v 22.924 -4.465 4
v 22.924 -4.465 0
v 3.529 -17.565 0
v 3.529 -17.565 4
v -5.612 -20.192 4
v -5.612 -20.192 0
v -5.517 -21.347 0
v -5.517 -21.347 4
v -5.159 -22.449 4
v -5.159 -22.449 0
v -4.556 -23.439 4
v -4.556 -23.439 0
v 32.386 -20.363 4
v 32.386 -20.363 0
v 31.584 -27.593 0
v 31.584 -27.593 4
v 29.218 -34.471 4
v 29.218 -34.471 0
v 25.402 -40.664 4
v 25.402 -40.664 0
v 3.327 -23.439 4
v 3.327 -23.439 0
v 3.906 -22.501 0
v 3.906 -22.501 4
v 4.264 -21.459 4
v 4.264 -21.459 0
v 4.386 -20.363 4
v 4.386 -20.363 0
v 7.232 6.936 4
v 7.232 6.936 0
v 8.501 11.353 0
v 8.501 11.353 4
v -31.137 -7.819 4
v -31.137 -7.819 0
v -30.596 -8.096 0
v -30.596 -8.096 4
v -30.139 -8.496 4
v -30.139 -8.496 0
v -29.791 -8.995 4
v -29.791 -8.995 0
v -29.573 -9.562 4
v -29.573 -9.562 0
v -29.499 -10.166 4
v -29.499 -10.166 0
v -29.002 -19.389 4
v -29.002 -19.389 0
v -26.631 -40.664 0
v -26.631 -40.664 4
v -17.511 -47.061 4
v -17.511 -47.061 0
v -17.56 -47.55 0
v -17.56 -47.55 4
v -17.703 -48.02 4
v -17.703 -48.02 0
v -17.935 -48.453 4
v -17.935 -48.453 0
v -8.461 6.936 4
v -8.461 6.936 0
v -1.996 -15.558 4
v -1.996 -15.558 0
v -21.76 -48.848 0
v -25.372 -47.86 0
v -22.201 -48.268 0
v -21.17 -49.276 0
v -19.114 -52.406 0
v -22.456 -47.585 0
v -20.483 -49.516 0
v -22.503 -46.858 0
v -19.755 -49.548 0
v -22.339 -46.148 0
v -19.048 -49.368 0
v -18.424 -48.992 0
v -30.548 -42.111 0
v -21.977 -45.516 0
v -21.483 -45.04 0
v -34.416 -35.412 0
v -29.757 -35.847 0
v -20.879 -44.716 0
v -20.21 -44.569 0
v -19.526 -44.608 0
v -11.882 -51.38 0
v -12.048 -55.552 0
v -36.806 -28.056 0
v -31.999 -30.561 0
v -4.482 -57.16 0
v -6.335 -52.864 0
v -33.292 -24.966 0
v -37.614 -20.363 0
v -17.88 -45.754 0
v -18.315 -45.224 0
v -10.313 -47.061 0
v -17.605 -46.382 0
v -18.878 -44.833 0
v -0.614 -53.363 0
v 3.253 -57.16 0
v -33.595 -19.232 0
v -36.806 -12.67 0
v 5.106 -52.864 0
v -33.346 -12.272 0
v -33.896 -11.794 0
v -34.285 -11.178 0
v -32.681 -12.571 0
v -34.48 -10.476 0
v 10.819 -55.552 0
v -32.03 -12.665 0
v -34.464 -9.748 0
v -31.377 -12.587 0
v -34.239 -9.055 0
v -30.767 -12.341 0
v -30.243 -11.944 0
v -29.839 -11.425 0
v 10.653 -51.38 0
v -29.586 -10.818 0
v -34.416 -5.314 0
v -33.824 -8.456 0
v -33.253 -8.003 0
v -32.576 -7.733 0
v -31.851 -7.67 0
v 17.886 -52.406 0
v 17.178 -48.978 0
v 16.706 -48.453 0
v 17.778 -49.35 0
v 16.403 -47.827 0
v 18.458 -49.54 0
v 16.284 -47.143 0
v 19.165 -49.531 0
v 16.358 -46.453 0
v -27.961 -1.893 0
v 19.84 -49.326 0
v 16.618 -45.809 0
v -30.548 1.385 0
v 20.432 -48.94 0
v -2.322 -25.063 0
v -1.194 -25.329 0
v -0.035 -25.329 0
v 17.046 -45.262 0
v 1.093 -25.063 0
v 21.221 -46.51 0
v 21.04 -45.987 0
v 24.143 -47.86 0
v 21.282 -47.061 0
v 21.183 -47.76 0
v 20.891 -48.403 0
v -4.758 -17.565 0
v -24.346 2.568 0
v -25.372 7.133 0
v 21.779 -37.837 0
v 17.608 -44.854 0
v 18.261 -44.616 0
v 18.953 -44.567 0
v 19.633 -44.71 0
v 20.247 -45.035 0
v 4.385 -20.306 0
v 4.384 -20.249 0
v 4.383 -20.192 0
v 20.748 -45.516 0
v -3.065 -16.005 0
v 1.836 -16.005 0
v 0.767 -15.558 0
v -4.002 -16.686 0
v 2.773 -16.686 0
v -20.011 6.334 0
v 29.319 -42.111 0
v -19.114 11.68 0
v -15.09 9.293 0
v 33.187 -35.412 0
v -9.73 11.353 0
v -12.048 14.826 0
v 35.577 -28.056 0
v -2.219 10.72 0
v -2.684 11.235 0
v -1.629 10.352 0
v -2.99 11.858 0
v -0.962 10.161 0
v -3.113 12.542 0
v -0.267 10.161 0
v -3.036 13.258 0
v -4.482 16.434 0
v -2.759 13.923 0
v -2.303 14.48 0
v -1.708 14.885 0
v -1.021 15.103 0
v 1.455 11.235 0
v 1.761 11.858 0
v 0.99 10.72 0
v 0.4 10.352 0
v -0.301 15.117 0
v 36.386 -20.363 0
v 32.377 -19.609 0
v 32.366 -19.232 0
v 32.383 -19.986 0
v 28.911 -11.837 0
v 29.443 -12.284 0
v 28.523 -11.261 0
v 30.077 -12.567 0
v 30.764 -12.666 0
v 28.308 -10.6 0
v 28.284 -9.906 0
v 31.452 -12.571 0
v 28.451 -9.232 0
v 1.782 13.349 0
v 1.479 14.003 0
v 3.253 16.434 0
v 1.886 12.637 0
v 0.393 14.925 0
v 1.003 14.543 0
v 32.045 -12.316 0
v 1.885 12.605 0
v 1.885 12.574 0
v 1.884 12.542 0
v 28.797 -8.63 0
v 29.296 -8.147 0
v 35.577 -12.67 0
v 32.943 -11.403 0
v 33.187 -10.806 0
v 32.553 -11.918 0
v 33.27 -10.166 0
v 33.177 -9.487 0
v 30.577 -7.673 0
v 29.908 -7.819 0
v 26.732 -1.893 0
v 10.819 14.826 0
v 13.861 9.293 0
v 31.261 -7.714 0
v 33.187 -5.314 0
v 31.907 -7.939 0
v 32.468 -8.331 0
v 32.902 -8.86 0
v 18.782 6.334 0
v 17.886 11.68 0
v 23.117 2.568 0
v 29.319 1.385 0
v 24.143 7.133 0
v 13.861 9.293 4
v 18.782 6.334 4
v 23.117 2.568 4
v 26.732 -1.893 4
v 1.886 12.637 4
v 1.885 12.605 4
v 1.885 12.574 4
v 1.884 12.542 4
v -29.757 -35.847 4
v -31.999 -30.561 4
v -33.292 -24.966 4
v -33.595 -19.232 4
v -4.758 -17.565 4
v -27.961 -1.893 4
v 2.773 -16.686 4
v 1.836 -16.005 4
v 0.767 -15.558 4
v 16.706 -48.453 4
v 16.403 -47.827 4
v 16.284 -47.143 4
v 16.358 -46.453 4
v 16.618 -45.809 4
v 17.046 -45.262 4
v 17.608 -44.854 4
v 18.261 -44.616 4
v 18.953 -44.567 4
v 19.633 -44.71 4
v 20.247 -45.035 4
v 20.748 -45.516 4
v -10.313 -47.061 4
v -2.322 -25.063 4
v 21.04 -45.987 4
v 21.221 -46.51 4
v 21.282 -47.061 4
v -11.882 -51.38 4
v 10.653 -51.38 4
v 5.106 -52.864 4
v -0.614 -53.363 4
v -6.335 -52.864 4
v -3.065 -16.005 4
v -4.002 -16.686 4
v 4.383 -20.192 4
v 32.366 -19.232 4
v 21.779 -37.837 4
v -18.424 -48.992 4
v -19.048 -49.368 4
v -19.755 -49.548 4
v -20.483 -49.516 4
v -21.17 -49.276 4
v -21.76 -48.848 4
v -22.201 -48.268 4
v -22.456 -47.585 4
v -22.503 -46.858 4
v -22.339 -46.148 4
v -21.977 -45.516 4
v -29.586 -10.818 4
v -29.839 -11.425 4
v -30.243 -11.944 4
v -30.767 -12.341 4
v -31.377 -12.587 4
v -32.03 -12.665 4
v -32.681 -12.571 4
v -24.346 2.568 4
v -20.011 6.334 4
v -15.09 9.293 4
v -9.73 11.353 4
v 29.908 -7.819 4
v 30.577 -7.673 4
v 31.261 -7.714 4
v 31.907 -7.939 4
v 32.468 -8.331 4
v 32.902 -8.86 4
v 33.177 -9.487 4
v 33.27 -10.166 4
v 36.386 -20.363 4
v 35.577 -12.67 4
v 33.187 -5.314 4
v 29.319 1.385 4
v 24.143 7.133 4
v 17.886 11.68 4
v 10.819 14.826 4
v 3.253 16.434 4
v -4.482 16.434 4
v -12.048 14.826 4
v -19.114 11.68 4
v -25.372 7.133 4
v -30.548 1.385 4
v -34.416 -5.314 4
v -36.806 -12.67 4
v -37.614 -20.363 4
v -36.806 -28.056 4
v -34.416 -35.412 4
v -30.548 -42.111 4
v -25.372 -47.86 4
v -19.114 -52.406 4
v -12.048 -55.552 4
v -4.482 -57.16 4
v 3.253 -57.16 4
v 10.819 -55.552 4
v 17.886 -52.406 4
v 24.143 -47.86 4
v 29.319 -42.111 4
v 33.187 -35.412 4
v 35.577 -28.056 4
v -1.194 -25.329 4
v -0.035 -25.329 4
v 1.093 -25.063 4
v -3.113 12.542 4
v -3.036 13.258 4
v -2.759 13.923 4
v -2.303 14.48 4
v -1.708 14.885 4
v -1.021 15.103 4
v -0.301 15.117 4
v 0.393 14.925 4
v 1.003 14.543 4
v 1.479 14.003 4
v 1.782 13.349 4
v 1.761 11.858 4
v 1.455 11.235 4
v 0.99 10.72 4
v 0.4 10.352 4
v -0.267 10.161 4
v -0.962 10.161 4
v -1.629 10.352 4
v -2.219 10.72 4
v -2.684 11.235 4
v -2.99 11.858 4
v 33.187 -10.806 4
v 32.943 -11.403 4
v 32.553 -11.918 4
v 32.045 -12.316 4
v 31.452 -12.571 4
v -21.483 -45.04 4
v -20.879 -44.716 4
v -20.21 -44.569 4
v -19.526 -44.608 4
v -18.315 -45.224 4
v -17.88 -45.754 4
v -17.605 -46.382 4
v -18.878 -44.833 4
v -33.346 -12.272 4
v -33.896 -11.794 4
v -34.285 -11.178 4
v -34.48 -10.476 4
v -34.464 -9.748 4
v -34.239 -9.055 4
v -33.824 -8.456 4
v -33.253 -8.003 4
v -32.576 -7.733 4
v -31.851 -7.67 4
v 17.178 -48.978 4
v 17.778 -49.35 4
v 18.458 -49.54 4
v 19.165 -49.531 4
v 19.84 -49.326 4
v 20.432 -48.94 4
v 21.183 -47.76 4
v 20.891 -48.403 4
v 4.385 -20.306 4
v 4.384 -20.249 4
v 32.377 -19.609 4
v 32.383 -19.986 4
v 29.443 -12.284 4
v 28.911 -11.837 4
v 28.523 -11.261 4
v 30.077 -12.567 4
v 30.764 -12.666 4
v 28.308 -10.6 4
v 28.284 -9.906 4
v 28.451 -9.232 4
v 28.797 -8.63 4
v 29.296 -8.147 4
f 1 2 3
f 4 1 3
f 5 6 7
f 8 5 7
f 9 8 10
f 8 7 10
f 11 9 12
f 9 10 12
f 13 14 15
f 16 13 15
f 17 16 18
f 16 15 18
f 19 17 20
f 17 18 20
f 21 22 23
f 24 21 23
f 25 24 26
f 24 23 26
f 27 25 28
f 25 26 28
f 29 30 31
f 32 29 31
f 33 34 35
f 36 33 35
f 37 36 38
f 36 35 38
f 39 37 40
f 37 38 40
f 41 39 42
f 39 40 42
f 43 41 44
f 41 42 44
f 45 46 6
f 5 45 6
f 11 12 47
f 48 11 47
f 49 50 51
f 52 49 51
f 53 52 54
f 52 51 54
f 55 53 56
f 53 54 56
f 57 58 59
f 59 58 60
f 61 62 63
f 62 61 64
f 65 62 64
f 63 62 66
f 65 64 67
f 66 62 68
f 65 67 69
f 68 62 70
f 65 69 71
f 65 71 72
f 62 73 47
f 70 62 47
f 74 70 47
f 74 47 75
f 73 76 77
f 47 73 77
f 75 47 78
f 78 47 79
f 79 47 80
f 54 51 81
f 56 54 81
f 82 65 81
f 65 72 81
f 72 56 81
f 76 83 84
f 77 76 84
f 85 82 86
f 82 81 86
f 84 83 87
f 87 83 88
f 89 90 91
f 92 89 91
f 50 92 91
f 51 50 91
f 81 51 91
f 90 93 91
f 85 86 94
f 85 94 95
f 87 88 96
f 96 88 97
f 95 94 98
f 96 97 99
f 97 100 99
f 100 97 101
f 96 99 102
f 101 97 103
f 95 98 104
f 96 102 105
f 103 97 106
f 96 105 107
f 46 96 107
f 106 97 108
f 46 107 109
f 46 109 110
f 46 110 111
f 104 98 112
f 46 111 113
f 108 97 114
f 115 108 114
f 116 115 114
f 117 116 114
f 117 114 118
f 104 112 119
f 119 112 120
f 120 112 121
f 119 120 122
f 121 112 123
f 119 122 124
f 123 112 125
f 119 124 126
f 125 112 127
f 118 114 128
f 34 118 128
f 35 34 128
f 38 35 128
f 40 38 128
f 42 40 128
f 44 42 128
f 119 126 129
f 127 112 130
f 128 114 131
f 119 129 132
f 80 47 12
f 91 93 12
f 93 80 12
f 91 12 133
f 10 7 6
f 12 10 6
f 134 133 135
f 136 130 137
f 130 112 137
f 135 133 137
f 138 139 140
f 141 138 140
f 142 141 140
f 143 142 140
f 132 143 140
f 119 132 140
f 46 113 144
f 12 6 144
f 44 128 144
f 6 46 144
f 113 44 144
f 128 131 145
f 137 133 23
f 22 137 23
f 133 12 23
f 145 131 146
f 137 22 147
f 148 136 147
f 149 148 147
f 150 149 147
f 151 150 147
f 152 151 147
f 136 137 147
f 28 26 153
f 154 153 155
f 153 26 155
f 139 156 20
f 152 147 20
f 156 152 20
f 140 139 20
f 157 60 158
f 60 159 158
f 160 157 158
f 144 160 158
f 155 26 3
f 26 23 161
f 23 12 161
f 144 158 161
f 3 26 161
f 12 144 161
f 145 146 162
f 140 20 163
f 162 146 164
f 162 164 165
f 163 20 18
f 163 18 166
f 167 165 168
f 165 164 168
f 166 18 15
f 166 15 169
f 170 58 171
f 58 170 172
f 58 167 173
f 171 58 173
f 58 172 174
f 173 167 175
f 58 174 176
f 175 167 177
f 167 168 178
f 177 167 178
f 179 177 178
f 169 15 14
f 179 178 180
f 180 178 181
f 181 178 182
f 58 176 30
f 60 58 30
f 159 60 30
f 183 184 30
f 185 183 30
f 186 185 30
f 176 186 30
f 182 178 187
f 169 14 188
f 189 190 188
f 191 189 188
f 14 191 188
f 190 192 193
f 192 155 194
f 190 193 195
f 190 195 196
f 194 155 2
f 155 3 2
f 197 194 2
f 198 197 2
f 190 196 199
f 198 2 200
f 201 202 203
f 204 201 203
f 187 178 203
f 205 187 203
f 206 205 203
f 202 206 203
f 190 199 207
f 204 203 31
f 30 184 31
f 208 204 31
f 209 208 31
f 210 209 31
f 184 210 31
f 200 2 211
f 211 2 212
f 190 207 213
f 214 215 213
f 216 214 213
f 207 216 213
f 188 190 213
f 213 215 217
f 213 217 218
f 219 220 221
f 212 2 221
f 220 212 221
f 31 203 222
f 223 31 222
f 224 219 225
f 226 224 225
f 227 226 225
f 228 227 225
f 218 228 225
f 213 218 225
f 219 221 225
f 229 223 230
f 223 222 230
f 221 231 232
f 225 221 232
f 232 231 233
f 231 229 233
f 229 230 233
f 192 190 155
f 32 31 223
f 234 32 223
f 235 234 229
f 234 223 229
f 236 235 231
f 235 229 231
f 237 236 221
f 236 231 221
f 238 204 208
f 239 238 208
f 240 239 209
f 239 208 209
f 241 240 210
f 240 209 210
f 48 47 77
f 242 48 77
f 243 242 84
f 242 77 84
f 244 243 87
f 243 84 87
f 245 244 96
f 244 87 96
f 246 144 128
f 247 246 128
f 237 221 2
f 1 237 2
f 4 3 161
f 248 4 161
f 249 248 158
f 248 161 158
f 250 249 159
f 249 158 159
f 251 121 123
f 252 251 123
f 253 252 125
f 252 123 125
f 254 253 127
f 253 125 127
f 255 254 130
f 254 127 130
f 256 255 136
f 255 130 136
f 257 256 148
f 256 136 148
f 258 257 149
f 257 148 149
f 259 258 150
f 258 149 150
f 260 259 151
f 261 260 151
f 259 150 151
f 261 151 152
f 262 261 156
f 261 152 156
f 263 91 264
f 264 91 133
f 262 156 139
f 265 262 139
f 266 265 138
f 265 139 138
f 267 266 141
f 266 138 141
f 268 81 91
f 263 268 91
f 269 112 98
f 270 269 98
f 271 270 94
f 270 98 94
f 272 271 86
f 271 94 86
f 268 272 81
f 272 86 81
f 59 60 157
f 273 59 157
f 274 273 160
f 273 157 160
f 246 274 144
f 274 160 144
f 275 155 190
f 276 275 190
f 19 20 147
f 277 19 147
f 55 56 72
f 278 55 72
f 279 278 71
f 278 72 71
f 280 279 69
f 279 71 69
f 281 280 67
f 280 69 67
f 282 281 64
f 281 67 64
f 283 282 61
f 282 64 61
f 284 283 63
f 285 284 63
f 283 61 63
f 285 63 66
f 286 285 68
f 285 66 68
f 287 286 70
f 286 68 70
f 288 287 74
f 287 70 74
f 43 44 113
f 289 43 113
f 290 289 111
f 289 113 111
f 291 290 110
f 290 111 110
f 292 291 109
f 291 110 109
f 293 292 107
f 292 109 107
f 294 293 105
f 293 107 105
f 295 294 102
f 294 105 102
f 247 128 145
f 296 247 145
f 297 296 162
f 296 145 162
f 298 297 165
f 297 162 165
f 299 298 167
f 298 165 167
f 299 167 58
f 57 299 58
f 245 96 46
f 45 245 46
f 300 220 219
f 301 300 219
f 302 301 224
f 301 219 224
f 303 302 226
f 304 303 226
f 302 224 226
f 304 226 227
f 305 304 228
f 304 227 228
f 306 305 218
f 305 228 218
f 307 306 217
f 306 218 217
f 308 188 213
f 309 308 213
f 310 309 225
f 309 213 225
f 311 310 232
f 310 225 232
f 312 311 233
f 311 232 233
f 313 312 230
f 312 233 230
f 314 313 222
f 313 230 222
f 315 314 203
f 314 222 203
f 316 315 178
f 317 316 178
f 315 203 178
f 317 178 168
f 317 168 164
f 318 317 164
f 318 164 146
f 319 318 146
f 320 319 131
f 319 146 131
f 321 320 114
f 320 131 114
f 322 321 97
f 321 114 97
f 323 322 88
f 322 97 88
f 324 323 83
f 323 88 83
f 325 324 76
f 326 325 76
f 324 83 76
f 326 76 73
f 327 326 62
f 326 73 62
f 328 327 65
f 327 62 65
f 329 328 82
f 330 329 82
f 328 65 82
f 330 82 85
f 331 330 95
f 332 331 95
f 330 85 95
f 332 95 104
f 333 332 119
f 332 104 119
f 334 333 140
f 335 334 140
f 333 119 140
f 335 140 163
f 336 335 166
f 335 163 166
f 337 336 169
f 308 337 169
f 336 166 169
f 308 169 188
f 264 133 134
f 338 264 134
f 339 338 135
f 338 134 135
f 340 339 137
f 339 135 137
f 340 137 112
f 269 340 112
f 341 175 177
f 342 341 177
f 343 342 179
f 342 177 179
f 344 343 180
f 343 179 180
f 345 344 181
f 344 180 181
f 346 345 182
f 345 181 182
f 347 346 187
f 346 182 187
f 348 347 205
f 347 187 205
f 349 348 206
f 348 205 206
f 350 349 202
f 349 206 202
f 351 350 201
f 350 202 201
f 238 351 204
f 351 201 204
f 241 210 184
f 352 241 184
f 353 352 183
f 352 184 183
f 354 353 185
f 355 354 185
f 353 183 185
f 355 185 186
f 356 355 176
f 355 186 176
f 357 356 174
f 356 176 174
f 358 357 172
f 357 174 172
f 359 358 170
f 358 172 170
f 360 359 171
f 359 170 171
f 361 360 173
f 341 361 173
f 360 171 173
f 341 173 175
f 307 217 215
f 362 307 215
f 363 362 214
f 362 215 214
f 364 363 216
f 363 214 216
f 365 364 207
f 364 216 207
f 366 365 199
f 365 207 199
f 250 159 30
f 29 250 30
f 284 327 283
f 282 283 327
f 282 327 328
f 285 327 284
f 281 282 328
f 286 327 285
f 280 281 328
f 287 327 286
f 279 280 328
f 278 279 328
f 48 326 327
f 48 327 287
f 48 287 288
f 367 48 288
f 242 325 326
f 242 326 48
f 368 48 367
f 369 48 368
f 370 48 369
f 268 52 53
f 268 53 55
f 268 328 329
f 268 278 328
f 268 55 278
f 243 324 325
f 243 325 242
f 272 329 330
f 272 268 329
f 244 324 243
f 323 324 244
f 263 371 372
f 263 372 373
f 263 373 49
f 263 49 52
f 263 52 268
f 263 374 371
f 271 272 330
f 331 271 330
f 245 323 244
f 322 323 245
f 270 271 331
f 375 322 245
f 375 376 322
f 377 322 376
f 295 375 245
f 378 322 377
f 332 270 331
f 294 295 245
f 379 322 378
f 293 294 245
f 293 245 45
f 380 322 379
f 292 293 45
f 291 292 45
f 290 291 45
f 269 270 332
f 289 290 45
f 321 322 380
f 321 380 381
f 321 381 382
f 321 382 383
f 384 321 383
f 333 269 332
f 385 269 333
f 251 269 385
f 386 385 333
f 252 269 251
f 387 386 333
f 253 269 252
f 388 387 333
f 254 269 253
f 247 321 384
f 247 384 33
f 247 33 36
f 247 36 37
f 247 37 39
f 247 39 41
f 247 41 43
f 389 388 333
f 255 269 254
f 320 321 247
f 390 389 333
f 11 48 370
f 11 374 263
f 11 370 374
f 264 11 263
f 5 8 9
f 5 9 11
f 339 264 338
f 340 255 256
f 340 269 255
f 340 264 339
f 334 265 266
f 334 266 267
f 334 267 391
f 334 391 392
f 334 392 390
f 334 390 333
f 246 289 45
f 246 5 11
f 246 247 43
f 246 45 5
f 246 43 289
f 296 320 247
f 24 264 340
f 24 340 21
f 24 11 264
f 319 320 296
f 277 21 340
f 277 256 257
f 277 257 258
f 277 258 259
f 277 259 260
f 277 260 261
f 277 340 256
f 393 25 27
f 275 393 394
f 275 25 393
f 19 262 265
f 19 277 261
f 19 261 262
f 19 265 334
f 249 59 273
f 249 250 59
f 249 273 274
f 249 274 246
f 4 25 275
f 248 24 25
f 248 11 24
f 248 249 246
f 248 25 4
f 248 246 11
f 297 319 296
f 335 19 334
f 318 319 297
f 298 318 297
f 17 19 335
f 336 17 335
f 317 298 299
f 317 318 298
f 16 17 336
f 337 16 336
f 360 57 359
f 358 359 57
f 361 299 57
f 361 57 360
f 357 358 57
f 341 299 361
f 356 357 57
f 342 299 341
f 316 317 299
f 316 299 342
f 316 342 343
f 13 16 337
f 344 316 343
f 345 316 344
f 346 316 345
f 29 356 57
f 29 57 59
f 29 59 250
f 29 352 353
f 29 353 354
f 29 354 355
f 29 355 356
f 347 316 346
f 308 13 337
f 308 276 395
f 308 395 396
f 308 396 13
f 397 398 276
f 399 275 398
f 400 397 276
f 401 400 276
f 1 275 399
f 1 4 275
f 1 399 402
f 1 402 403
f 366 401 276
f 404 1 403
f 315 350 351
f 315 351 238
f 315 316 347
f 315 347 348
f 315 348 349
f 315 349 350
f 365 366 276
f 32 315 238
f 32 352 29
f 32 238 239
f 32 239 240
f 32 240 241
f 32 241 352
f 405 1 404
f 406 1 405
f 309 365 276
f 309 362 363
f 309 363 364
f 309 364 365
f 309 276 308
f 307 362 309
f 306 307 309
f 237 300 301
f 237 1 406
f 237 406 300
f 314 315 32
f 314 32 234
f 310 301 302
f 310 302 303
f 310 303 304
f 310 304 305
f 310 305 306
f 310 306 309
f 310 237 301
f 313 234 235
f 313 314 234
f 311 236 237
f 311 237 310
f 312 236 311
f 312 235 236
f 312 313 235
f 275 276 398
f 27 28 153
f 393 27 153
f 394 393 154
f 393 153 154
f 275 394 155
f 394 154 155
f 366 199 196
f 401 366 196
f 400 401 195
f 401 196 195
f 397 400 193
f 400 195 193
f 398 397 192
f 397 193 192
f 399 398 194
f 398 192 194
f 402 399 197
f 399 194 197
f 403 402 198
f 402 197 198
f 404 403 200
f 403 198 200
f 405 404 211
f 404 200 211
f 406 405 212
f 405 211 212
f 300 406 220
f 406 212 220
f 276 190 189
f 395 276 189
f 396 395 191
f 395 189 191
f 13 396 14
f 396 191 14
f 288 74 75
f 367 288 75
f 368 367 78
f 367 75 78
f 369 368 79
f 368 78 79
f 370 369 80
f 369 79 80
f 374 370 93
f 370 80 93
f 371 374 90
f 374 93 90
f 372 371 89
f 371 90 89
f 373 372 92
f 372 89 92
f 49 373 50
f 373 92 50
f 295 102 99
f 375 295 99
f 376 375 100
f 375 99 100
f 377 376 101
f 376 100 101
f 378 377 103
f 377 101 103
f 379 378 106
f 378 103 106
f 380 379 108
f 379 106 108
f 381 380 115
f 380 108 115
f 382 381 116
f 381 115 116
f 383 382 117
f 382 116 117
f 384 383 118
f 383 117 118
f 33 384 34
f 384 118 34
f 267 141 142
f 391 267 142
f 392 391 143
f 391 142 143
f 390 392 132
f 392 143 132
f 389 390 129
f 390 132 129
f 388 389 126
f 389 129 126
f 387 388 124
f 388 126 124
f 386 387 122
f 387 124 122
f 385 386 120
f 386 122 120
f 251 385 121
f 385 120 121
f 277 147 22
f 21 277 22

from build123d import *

# Parameters (mm, degrees)
F0_R     = 37
F1_DEPTH = 4


with BuildPart() as f1:
    # F0 (on Top) → F1 (new body)
    with BuildSketch(Plane.XY):
        with Locations((-0.6144908867, -20.3631758839)):
            Circle(F0_R)
        with BuildLine():
            ThreePointArc((-3.1126967397, 12.5421271465), (-0.6618478689, 15.1363755392), (1.8855091133, 12.6368241161))
            ThreePointArc((1.8855091133, 12.6368241161), (1.8850605363, 12.589467134), (1.8837149663, 12.5421271464))
            ThreePointArc((1.8837149663, 12.5421271465), (5.2227863742, 12.1164514875), (8.5011233102, 11.3528386484))
            ThreePointArc((8.5011233102, 11.3528386484), (18.7824224389, 6.3343849305), (26.7323517041, -1.8929241175))
            ThreePointArc((26.7323517041, -1.8929241175), (28.4716524971, -4.7748384787), (29.9083239169, -7.8189430869))
            ThreePointArc((29.9083239169, -7.8189430869), (32.2012610114, -8.1155997543), (33.270374151, -10.1656150695))
            ThreePointArc((33.270374151, -10.1656150695), (32.7647179948, -11.6731271366), (31.4523000449, -12.570812998))
            ThreePointArc((31.4523000449, -12.570812998), (32.0792882461, -15.8779996316), (32.3661111061, -19.2318526816))
            ThreePointArc((32.3661111061, -19.2318526816), (32.3806592551, -19.7974311378), (32.3855091133, -20.3631758839))
            ThreePointArc((32.3855091133, -20.3631758839), (30.5909369208, -31.0972932369), (25.4024015163, -40.6639470438))
            ThreePointArc((25.4024015163, -40.6639470438), (23.199011587, -43.2086809107), (20.7478519472, -45.5157166828))
            ThreePointArc((20.7478519472, -45.5157166828), (21.1450029953, -46.2432936637), (21.2824224389, -47.0607366982))
            ThreePointArc((21.2824224389, -47.0607366982), (19.5097871405, -49.4525854792), (16.7056699662, -48.452533798))
            ThreePointArc((16.7056699662, -48.452533798), (13.7540985771, -50.0708118857), (10.6530279173, -51.3799942249))
            ThreePointArc((10.6530279173, -51.3799942249), (-0.6144908867, -53.3631758839), (-11.8820096908, -51.3799942249))
            ThreePointArc((-11.8820096908, -51.3799942249), (-14.9830803506, -50.0708118857), (-17.9346517396, -48.452533798))
            ThreePointArc((-17.9346517396, -48.452533798), (-21.4808673431, -49.0832791842), (-21.9768337207, -45.5157166828))
            ThreePointArc((-21.9768337207, -45.5157166828), (-24.4279933605, -43.2086809107), (-26.6313832898, -40.6639470438))
            ThreePointArc((-26.6313832898, -40.6639470438), (-31.9993559245, -30.5607366982), (-33.5950928796, -19.2318526816))
            ThreePointArc((-33.5950928796, -19.2318526816), (-33.3082700196, -15.8779996316), (-32.6812818184, -12.570812998))
            ThreePointArc((-32.6812818184, -12.570812998), (-34.3769972152, -9.3930725835), (-31.1373056904, -7.8189430869))
            ThreePointArc((-31.1373056904, -7.8189430869), (-29.7006342706, -4.7748384787), (-27.9613334776, -1.8929241175))
            ThreePointArc((-27.9613334776, -1.8929241175), (-20.0114042124, 6.3343849305), (-9.7301050837, 11.3528386484))
            ThreePointArc((-9.7301050837, 11.3528386484), (-6.4517681477, 12.1164514875), (-3.1126967397, 12.5421271465))
        make_face(mode=Mode.SUBTRACT)
        with BuildLine():
            ThreePointArc((3.5289701119, -17.564652889), (2.3244353747, -16.318090912), (0.7666627795, -15.5577191365))
            Line((0.7666627795, -15.5577191365), (-0.6144908867, -20.3631758839))
            Line((-0.6144908867, -20.3631758839), (3.5289701119, -17.564652889))
        make_face()
        with BuildLine():
            ThreePointArc((0.7666627795, -15.5577191365), (-0.6144908867, -15.3631758839), (-1.9956445529, -15.5577191365))
            Line((-1.9956445529, -15.5577191365), (-0.6144908867, -20.3631758839))
            Line((-0.6144908867, -20.3631758839), (0.7666627795, -15.5577191365))
        make_face()
        with BuildLine():
            Line((-0.6144908867, -20.3631758839), (-1.9956445529, -15.5577191365))
            ThreePointArc((-1.9956445529, -15.5577191365), (-3.5534171482, -16.318090912), (-4.7579518853, -17.564652889))
            Line((-4.7579518853, -17.564652889), (-0.6144908867, -20.3631758839))
        make_face()
        with BuildLine():
            Line((-0.6144908867, -20.3631758839), (-4.7579518853, -17.564652889))
            ThreePointArc((-4.7579518853, -17.564652889), (-5.3697734682, -18.818090912), (-5.6115517947, -20.1917632774))
            Line((-5.6115517947, -20.1917632774), (-0.6144908867, -20.3631758839))
        make_face()
        with BuildLine():
            Line((-4.5564442811, -23.439050302), (-0.6144908867, -20.3631758839))
            Line((-0.6144908867, -20.3631758839), (-5.6115517947, -20.1917632774))
            ThreePointArc((-5.6115517947, -20.1917632774), (-5.3697734682, -21.9082608557), (-4.5564442811, -23.439050302))
        make_face()
        with BuildLine():
            Line((-2.3216907055, -25.0626938143), (-0.6144908867, -20.3631758839))
            Line((-0.6144908867, -20.3631758839), (-4.5564442811, -23.439050302))
            ThreePointArc((-4.5564442811, -23.439050302), (-3.5534171482, -24.4082608557), (-2.3216907055, -25.0626938143))
        make_face()
        with BuildLine():
            Line((1.0927089321, -25.0626938143), (-0.6144908867, -20.3631758839))
            Line((-0.6144908867, -20.3631758839), (-2.3216907055, -25.0626938143))
            ThreePointArc((-2.3216907055, -25.0626938143), (-0.6144908867, -25.3631758839), (1.0927089321, -25.0626938143))
        make_face()
        with BuildLine():
            Line((3.3274625077, -23.439050302), (-0.6144908867, -20.3631758839))
            Line((-0.6144908867, -20.3631758839), (1.0927089321, -25.0626938143))
            ThreePointArc((1.0927089321, -25.0626938143), (2.3244353747, -24.4082608557), (3.3274625077, -23.439050302))
        make_face()
        with BuildLine():
            Line((3.5289701119, -17.564652889), (-0.6144908867, -20.3631758839))
            Line((-0.6144908867, -20.3631758839), (4.3825700213, -20.1917632774))
            ThreePointArc((4.3825700213, -20.1917632774), (4.1407916947, -18.818090912), (3.5289701119, -17.564652889))
        make_face()
        with BuildLine():
            Line((4.3825700213, -20.1917632774), (-0.6144908867, -20.3631758839))
            Line((-0.6144908867, -20.3631758839), (3.3274625077, -23.439050302))
            ThreePointArc((3.3274625077, -23.439050302), (4.1136042356, -21.989557301), (4.3855091133, -20.3631758839))
            ThreePointArc((4.3855091133, -20.3631758839), (4.3847742863, -20.2774569829), (4.3825700213, -20.1917632774))
        make_face()
        with BuildLine():
            ThreePointArc((1.8837149663, 12.5421271464), (-0.6144908867, 10.1368241161), (-3.1126967397, 12.5421271465))
            ThreePointArc((-3.1126967397, 12.5421271465), (-6.4517681477, 12.1164514875), (-9.7301050837, 11.3528386484))
            Line((-9.7301050837, 11.3528386484), (-8.4607071462, 6.9362143197))
            Line((-8.4607071462, 6.9362143197), (-1.9956445529, -15.5577191365))
            ThreePointArc((-1.9956445529, -15.5577191365), (-0.6144908867, -15.3631758839), (0.7666627795, -15.5577191365))
            Line((0.7666627795, -15.5577191365), (7.2317253727, 6.9362143197))
            Line((7.2317253727, 6.9362143197), (8.5011233102, 11.3528386484))
            ThreePointArc((8.5011233102, 11.3528386484), (5.2227863742, 12.1164514875), (1.8837149663, 12.5421271465))
        make_face()
        with BuildLine():
            ThreePointArc((29.9083239169, -7.8189430869), (28.4716524971, -4.7748384787), (26.7323517041, -1.8929241175))
            Line((26.7323517041, -1.8929241175), (22.9241578916, -4.4650052731))
            Line((22.9241578916, -4.4650052731), (3.5289701119, -17.564652889))
            ThreePointArc((3.5289701119, -17.564652889), (4.1407916947, -18.818090912), (4.3825700213, -20.1917632774))
            Line((4.3825700213, -20.1917632774), (32.3661111061, -19.2318526816))
            ThreePointArc((32.3661111061, -19.2318526816), (32.0792882461, -15.8779996316), (31.4523000449, -12.570812998))
            ThreePointArc((31.4523000449, -12.570812998), (28.3927328603, -10.9381575554), (29.9083239169, -7.8189430869))
        make_face()
        with BuildLine():
            ThreePointArc((3.3274625077, -23.439050302), (2.3244353747, -24.4082608557), (1.0927089321, -25.0626938143))
            Line((1.0927089321, -25.0626938143), (10.6530279173, -51.3799942249))
            ThreePointArc((10.6530279173, -51.3799942249), (13.7540985771, -50.0708118857), (16.7056699662, -48.452533798))
            ThreePointArc((16.7056699662, -48.452533798), (17.3129593082, -45.0381942123), (20.7478519472, -45.5157166828))
            ThreePointArc((20.7478519472, -45.5157166828), (23.199011587, -43.2086809107), (25.4024015163, -40.6639470438))
            Line((25.4024015163, -40.6639470438), (21.7794103669, -37.836956291))
            Line((21.7794103669, -37.836956291), (3.3274625077, -23.439050302))
        make_face()
        with BuildLine():
            ThreePointArc((-2.3216907055, -25.0626938143), (-3.5534171482, -24.4082608557), (-4.5564442811, -23.439050302))
            Line((-4.5564442811, -23.439050302), (-26.6313832898, -40.6639470438))
            ThreePointArc((-26.6313832898, -40.6639470438), (-24.4279933605, -43.2086809107), (-21.9768337207, -45.5157166828))
            ThreePointArc((-21.9768337207, -45.5157166828), (-19.1939611779, -44.6981561418), (-17.5114042124, -47.0607366982))
            ThreePointArc((-17.5114042124, -47.0607366982), (-17.6195554314, -47.7881013998), (-17.9346517396, -48.452533798))
            ThreePointArc((-17.9346517396, -48.452533798), (-14.9830803506, -50.0708118857), (-11.8820096908, -51.3799942249))
            Line((-11.8820096908, -51.3799942249), (-10.3129475496, -47.0607366982))
            Line((-10.3129475496, -47.0607366982), (-2.3216907055, -25.0626938143))
        make_face()
        with BuildLine():
            Line((-4.7579518853, -17.564652889), (-27.9613334776, -1.8929241175))
            ThreePointArc((-27.9613334776, -1.8929241175), (-29.7006342706, -4.7748384787), (-31.1373056904, -7.8189430869))
            ThreePointArc((-31.1373056904, -7.8189430869), (-29.9493406093, -8.7347282091), (-29.4993559245, -10.1656150695))
            ThreePointArc((-29.4993559245, -10.1656150695), (-30.4918438573, -12.1599589133), (-32.6812818184, -12.570812998))
            ThreePointArc((-32.6812818184, -12.570812998), (-33.3082700196, -15.8779996316), (-33.5950928796, -19.2318526816))
            Line((-33.5950928796, -19.2318526816), (-29.0023679965, -19.3893954767))
            Line((-29.0023679965, -19.3893954767), (-5.6115517947, -20.1917632774))
            ThreePointArc((-5.6115517947, -20.1917632774), (-5.3697734682, -18.818090912), (-4.7579518853, -17.564652889))
        make_face()
    extrude(amount=F1_DEPTH)


solid = f1.part
